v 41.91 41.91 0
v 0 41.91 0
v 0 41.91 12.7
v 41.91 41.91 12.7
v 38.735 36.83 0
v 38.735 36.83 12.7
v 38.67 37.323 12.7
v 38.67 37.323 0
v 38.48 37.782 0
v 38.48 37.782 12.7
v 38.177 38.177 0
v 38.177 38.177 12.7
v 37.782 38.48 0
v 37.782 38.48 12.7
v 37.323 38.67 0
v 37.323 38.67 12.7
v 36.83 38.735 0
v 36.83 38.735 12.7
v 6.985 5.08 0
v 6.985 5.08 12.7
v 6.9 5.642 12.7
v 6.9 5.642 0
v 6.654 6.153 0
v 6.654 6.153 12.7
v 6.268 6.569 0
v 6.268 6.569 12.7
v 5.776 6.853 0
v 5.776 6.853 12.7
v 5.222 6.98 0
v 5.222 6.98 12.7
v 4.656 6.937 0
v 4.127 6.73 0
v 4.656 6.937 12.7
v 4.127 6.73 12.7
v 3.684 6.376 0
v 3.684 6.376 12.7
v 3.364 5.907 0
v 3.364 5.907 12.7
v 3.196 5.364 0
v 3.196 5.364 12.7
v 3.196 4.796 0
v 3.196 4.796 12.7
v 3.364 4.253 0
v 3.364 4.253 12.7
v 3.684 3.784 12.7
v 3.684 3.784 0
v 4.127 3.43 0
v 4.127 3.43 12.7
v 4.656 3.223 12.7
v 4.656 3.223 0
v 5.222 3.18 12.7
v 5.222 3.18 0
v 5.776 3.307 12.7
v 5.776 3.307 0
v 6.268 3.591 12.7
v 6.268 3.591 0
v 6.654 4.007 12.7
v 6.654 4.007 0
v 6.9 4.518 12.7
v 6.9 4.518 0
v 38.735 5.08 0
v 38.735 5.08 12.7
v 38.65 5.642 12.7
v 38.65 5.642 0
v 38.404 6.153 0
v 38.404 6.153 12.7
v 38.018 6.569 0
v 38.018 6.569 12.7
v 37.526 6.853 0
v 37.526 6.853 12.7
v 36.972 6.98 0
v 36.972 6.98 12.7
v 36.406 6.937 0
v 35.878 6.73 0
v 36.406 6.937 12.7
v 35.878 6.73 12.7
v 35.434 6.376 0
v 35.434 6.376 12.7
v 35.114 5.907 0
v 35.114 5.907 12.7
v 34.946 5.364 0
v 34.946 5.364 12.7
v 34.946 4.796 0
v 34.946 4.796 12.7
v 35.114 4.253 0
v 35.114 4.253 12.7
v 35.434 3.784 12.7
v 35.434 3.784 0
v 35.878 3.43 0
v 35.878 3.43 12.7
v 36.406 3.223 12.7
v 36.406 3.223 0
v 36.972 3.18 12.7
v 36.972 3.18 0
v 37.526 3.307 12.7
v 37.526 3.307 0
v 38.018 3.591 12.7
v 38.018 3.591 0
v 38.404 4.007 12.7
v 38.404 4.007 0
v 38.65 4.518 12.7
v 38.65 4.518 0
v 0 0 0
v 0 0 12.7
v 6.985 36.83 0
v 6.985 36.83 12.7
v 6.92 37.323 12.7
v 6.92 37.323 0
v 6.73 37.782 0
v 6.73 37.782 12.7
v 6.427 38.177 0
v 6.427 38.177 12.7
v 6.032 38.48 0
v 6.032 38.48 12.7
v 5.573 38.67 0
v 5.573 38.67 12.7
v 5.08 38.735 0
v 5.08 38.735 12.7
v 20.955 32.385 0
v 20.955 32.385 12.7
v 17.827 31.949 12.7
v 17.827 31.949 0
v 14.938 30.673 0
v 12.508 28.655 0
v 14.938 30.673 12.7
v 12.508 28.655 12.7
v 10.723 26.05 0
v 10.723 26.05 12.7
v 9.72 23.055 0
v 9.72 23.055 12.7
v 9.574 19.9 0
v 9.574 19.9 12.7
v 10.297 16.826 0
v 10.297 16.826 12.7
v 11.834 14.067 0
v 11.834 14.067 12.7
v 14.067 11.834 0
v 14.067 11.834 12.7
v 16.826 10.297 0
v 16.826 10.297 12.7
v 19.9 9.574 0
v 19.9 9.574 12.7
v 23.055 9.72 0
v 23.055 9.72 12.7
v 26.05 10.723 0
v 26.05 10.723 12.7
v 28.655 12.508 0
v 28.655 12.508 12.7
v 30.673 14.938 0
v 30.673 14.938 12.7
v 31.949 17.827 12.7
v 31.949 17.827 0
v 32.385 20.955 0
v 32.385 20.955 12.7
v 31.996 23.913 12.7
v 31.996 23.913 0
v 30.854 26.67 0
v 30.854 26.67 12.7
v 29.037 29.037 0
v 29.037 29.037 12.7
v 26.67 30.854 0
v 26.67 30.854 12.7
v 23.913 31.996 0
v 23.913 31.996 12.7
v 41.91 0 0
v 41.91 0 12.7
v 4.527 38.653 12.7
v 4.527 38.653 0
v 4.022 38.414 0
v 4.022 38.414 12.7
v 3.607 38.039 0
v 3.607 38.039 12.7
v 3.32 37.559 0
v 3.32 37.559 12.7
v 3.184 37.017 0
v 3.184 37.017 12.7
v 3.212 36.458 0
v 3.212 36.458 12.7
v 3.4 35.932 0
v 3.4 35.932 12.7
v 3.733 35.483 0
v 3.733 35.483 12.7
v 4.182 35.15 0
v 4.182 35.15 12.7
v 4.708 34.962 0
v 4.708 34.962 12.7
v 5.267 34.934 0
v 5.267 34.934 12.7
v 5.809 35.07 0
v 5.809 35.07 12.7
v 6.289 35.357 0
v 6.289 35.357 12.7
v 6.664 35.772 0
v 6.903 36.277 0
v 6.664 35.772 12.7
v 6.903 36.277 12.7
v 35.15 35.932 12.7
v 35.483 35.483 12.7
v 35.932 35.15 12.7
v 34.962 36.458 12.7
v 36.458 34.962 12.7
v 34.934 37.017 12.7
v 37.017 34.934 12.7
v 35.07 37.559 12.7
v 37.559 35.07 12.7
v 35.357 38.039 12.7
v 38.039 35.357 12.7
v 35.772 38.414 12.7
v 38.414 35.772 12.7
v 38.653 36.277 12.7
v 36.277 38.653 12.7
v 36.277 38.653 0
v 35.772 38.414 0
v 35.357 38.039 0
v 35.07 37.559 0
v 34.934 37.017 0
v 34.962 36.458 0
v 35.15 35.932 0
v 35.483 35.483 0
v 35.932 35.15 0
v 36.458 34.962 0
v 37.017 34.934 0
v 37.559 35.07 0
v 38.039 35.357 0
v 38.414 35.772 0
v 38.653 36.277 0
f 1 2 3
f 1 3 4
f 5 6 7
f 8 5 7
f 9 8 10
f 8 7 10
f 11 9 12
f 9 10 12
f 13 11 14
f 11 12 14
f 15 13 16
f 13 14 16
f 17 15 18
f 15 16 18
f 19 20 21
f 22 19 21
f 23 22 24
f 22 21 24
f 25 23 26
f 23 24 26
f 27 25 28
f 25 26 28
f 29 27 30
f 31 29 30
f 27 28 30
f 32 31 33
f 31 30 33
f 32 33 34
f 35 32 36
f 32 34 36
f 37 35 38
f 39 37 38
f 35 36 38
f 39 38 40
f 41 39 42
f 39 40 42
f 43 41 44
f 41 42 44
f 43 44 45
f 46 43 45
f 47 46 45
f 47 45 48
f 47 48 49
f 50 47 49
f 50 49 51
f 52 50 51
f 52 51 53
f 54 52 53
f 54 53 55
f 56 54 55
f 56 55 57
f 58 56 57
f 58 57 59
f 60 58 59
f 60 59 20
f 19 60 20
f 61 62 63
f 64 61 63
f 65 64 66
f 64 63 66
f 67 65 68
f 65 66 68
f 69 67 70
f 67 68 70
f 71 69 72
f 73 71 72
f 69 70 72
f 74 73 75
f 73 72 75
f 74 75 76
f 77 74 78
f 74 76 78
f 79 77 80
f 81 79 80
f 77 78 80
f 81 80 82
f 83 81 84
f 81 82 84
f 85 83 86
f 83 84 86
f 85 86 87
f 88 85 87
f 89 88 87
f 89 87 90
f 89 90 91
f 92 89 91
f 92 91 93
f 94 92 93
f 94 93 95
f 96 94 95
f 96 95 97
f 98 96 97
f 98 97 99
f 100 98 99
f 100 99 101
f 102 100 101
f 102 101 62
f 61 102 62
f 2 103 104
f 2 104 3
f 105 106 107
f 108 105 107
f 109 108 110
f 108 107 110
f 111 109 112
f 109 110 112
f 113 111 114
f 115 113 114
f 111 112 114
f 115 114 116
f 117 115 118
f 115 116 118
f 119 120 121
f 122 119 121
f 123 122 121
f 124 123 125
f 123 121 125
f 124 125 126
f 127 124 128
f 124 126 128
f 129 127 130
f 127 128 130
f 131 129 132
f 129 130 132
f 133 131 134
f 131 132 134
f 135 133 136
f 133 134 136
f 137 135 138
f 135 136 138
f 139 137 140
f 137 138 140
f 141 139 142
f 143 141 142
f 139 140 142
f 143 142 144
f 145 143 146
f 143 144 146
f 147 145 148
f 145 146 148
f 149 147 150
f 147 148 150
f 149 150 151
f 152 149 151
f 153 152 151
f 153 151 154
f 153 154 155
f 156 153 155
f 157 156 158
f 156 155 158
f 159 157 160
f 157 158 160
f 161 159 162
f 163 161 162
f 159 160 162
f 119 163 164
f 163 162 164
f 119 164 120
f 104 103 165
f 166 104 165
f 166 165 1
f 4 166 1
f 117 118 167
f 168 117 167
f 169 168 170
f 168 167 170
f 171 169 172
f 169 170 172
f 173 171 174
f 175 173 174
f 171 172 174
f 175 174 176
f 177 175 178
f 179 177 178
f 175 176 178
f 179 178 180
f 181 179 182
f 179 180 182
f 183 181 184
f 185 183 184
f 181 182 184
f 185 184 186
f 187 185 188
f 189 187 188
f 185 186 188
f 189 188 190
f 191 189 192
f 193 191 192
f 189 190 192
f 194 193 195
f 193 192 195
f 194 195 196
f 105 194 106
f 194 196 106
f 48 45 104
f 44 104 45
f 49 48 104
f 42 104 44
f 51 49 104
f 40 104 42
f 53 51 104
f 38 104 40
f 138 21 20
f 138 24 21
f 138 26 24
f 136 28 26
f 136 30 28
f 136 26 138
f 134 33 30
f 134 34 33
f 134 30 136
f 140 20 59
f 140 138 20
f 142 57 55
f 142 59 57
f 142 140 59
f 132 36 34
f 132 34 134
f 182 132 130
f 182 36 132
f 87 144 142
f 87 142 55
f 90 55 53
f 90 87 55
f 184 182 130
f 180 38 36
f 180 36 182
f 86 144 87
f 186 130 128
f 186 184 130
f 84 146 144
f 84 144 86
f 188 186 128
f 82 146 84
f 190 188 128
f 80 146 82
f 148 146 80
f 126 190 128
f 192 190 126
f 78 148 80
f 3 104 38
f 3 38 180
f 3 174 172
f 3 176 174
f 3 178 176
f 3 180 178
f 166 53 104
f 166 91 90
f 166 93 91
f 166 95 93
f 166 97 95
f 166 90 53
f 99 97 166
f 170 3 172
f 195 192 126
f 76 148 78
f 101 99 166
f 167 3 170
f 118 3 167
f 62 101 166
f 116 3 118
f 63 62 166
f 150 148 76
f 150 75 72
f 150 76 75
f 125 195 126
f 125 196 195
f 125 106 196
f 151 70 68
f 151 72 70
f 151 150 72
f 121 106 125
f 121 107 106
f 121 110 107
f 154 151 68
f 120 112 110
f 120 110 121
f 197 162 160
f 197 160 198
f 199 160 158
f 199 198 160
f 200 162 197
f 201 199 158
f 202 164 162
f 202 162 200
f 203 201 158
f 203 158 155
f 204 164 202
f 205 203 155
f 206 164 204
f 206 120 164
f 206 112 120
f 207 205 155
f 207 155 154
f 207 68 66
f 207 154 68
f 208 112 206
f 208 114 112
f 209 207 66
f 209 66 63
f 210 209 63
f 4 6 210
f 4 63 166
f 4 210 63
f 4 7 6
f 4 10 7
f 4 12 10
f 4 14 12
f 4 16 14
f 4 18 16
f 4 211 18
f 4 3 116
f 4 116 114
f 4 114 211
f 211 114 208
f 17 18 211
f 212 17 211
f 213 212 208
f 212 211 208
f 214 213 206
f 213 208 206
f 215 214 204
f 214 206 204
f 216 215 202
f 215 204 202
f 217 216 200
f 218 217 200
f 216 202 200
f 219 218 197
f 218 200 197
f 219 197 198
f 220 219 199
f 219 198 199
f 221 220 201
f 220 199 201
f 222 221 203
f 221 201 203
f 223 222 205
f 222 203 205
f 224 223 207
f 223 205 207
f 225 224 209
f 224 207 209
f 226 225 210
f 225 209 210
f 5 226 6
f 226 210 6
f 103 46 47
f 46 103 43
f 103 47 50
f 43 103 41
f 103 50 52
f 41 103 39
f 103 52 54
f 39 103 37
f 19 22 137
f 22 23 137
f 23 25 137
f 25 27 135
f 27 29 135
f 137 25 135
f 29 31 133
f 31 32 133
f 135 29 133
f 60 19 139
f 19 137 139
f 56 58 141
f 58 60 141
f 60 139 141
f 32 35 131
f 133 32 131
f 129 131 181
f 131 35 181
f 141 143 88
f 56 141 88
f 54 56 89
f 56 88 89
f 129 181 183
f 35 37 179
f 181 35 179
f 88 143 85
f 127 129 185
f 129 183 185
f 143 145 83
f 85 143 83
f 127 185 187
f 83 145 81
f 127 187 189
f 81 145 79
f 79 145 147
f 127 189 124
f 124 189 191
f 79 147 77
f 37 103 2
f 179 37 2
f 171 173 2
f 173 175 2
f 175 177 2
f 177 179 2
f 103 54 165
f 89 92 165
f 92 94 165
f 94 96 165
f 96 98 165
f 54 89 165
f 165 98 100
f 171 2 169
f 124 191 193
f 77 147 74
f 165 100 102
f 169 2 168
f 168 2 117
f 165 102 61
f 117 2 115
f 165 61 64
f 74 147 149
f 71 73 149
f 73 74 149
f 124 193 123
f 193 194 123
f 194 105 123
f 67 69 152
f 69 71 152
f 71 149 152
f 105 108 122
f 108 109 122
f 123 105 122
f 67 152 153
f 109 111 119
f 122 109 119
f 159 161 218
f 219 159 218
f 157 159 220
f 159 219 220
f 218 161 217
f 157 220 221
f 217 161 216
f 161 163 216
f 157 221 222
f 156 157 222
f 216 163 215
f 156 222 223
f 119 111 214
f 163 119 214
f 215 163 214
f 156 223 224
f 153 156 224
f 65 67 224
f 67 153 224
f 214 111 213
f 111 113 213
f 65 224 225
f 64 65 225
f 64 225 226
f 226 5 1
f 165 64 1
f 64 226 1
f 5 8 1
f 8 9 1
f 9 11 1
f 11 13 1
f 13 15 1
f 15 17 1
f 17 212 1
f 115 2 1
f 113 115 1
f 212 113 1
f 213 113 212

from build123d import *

# Parameters (mm, degrees)
F0_W     = 41.91
F0_H     = 41.91
F1_DEPTH = 12.7
F2_R     = 1.905
F3_DEPTH = 25.4
F5_DEPTH = 12.701


with BuildPart() as f1:
    # F0 (on Top) → F1 (new body)
    with BuildSketch(Plane.XY):
        with Locations((20.955, 20.955)):
            Rectangle(F0_W, F0_H)
    extrude(amount=F1_DEPTH)

    # F2 (on face) → F3 (cut)
    with BuildSketch(Plane.XY.offset(12.7)):
        with BuildLine():
            ThreePointArc((38.735, 36.83), (38.177038, 38.177038), (36.83, 38.735))
            ThreePointArc((36.83, 38.735), (35.482962, 35.482962), (38.735, 36.83))
        make_face()
        with Locations((5.08, 5.08)):
            Circle(F2_R)
        with BuildLine():
            ThreePointArc((6.985, 36.83), (6.427038, 38.177038), (5.08, 38.735))
            ThreePointArc((5.08, 38.735), (3.732962, 35.482962), (6.985, 36.83))
        make_face()
        with Locations((36.83, 5.08)):
            Circle(F2_R)
    extrude(amount=-F3_DEPTH, mode=Mode.SUBTRACT)

    # F4 (on face) → F5 (cut, through all)
    with BuildSketch(Plane.XY.offset(12.7)):
        with BuildLine():
            ThreePointArc((20.955, 32.385), (12.872769, 12.872769), (32.385, 20.955))
            ThreePointArc((32.385, 20.955), (29.037231, 29.037231), (20.955, 32.385))
        make_face()
    extrude(amount=-F5_DEPTH, mode=Mode.SUBTRACT)


solid = f1.part
